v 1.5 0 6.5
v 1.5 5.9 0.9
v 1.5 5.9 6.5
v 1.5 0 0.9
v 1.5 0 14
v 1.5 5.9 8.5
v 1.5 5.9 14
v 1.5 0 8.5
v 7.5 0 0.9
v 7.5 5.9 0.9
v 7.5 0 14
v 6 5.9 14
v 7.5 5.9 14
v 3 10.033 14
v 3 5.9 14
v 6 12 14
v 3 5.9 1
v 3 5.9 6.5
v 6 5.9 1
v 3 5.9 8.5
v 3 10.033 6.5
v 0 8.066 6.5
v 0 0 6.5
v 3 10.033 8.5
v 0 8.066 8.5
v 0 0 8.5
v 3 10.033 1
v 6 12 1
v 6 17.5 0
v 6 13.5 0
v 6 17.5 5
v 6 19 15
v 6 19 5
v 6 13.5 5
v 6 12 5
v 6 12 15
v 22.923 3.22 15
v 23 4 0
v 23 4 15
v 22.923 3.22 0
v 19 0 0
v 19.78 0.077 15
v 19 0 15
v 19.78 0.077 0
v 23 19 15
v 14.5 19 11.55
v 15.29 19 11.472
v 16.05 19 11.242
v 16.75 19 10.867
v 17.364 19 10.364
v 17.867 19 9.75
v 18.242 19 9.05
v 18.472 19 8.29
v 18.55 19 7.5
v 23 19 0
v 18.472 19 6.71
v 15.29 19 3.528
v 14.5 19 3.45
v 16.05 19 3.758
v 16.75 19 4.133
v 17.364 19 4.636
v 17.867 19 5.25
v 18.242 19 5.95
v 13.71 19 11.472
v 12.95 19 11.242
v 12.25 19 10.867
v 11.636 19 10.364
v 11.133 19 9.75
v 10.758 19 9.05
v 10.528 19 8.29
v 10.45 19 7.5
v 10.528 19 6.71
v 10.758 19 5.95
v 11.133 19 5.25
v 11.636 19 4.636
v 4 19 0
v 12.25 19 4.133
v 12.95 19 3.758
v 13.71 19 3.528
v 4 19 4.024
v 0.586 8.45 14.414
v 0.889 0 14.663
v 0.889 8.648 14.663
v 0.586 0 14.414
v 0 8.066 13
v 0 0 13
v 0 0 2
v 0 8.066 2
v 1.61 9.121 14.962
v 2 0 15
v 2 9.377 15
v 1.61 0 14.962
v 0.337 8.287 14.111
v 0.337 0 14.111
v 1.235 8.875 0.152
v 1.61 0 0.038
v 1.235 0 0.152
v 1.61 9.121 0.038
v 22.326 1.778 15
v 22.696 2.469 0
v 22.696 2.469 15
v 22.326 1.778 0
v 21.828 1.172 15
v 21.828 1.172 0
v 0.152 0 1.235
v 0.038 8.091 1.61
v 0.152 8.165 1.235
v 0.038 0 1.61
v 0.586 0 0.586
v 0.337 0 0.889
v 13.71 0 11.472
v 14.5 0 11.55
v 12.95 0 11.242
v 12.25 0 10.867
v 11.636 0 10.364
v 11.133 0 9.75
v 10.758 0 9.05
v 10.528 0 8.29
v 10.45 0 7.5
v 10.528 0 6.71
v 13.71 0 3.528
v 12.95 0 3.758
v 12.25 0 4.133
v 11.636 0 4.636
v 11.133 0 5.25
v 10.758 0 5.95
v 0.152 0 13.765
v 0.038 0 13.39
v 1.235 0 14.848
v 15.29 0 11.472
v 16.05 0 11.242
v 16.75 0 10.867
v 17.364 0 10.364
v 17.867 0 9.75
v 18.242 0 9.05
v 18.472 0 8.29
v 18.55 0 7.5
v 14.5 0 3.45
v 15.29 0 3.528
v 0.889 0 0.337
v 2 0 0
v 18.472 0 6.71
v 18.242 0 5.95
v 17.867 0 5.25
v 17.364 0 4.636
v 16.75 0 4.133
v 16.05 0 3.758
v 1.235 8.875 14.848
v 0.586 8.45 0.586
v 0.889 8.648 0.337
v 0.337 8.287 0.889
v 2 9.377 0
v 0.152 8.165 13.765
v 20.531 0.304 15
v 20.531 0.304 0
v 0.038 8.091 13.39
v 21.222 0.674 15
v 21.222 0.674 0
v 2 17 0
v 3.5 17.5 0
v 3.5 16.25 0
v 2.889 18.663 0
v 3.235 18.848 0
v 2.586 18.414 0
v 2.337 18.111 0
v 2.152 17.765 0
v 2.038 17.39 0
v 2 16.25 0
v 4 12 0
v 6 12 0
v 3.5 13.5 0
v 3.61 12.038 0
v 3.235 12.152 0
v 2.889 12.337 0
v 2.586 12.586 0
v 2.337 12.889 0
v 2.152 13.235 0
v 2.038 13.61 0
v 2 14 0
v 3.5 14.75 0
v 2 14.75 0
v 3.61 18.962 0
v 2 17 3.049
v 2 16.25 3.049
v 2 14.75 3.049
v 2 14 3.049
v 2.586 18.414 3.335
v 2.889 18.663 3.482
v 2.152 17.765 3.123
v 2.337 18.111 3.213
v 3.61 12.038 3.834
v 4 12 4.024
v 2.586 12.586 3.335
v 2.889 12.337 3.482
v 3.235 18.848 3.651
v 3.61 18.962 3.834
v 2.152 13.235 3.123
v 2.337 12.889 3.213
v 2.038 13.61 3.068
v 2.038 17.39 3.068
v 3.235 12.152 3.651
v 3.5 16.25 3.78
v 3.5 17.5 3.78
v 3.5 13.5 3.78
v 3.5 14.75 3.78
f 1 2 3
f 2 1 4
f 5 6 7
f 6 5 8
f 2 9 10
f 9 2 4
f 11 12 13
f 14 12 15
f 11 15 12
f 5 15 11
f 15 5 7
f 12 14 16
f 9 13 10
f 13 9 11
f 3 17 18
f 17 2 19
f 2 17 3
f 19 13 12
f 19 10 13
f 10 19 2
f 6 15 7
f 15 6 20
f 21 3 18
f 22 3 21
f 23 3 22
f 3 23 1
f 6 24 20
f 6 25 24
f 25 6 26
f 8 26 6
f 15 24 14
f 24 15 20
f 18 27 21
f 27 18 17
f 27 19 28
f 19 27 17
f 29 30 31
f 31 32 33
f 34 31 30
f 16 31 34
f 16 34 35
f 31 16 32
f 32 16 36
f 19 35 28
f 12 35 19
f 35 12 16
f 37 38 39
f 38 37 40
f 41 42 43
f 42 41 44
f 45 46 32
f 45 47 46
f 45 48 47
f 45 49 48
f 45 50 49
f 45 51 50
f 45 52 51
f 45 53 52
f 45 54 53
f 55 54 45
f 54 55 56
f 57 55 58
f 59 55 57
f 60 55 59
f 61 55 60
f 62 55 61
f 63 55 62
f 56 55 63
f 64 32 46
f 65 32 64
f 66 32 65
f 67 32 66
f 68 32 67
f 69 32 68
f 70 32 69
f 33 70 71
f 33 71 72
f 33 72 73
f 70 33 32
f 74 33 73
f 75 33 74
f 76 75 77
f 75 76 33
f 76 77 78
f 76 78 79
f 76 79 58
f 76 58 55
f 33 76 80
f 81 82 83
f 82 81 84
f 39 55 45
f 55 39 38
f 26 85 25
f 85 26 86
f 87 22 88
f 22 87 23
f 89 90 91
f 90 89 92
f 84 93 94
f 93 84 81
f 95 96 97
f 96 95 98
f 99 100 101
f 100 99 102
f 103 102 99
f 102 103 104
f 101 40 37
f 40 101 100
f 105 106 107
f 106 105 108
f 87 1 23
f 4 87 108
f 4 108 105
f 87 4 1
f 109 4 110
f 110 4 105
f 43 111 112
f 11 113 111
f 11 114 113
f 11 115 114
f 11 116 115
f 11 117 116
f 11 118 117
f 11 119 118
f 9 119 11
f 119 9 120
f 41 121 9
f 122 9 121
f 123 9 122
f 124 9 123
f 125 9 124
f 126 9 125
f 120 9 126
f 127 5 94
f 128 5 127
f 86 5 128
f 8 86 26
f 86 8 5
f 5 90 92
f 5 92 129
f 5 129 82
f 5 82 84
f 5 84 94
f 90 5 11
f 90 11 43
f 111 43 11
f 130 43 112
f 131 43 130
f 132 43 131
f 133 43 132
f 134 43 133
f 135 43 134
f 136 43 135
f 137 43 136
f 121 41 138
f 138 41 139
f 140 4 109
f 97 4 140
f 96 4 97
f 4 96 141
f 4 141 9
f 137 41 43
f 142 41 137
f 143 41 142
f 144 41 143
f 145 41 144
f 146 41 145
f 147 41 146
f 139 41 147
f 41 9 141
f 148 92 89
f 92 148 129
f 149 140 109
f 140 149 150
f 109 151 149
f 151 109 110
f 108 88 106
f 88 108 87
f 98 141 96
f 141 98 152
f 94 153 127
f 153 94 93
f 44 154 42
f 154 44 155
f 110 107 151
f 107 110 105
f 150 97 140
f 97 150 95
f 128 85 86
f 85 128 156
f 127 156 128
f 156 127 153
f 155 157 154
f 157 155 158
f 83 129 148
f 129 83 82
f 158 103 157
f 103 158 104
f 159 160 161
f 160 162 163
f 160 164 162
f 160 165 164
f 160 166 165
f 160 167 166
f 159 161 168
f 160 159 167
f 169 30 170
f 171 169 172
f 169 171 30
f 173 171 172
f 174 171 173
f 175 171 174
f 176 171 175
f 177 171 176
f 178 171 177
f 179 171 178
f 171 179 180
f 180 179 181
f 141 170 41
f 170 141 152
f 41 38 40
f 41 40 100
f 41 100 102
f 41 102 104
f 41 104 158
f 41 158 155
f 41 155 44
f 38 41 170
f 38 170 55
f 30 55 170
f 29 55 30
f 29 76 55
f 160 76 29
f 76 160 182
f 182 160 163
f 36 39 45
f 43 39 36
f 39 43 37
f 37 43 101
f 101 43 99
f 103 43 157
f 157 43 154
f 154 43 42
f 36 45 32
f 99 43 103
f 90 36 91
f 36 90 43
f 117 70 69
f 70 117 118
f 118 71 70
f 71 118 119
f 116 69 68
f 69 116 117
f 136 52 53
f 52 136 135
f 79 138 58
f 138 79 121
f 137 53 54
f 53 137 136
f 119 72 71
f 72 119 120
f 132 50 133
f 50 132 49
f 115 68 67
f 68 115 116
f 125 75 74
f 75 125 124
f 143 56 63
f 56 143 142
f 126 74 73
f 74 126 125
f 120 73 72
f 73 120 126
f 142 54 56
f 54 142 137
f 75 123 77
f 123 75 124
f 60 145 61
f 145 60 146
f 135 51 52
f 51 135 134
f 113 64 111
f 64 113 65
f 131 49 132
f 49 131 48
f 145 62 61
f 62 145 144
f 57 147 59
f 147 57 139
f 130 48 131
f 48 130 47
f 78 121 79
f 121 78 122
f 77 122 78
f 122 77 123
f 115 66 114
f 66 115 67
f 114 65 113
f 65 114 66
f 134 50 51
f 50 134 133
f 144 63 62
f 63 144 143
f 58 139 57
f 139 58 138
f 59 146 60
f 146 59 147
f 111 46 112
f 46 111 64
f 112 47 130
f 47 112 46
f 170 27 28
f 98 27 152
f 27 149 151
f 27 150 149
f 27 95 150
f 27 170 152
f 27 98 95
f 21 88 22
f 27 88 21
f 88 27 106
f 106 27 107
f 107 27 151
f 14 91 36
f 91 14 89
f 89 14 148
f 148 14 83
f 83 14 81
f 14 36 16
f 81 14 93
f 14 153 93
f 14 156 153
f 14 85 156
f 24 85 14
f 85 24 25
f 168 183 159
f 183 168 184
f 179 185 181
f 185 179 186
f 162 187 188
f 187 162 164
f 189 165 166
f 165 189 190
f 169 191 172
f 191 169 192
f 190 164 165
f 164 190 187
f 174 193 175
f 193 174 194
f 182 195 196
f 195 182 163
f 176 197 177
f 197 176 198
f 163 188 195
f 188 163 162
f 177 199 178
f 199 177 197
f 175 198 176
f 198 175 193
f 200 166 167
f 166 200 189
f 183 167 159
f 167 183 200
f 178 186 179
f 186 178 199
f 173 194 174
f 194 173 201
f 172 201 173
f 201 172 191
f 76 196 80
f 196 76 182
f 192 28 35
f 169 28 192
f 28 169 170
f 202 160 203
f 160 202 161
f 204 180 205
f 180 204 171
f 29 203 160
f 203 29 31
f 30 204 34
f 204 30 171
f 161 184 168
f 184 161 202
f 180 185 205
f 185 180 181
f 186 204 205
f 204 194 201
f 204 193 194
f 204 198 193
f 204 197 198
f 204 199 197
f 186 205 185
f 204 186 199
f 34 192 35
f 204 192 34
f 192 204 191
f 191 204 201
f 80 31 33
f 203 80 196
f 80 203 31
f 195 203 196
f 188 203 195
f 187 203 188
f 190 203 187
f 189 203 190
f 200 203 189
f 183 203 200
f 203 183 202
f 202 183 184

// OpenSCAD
/**
 * X-Axis endstop with configurable length
 *
 * This endstop is intended to work with the Prusa i3
 * Smooth X-Axis with threaded rods upgrade by MazaaFIN
 * (see http://www.thingiverse.com/thing:1103976).
 *
 * I use a different x-carriage that did not reach the
 * vanilla endstop from MazaaFINs files, so I replicated
 * it using his measurements in SCAD but made the length
 * configurable.
 *
 * Made in 2017 by Hendrik Busch using the initial work 
 * of MazaaFIN (http://www.thingiverse.com/MazaaFIN/about).
 * Licensed under a Creative Commons - Attribution - Non
 * Commercial License.
 *
 * https://creativecommons.org/licenses/by-nc/3.0/
 */

/**
 * The length of the endstop (in mm on the x-axis). Do not
 * set this to a value lower than 17.
 * 
 * The original part from MazaaFIN has a length of 19mm.
 */
endstopLength = 19;

/**
 * Use this to generate minimal supports for printing. The supports
 * generated by this option are usually enough to print this part
 * without enabling supports in your slicer (given the correct part
 * orientation). To enable supports, set this to true, to disable them,
 * set this to false.
 */
generateSupports = false;

/** 
 * Number of facets in a 360 degree arc, controls smoothness of rounded
 * edges. 32 is a good compromise between smoothness and processing speed.
 */
$fn=32;

rotate([0, 180, 0]) translate([-23, 0, -15]) mainBlock();

module mainBlock() {
    difference() {
        // solid block with rounded edges
        hull() {
            translate([0, endstopLength-1, 0]) cube([1, 1, 15]);
            translate([4, 4, 0]) cylinder(r=4, h=15);
            rotate([270, 0, 0]) translate([21, -2, 0]) cylinder(r=2, h=endstopLength);
            rotate([270, 0, 0]) translate([21, -13, 0]) cylinder(r=2, h=endstopLength);
        }    
        // M8 hole for smooth rod
        rotate([270, 0, 0]) translate([8.5, -7.5, -0.1]) cylinder(d=8.1, h=endstopLength+0.2);
        
        // Microswitch
        union() {
            // Cutout for the microswitch body
            translate([15.5, -0.1, 1]) cube([6, 6, 13.1]);
            
            // Cutout for the cable slot
            translate([19.9, -0.1, 6.5]) cube([3.6, 10.2, 2]);

            // Cutout for the pins
            translate([17, 5.8, 1]) cube([3, 6.2, 13]);
        }
        
        // Angled cutout
        translate([0,0,-0.1]) linear_extrude(height=15.2) polygon(points=[[17, endstopLength + 0.1], [23.1, endstopLength + 0.1], [23.1, 8], [17, 12]]);
    }
    
    // Cable slot on block
    difference() {
        hull() {
            translate([19, endstopLength-2, 10]) cylinder(r=2, h=5);
            translate([19, endstopLength-5, 10]) cylinder(r=2, h=5);
            translate([17, endstopLength-7, 10]) cube([1,7,5]);
        }
        translate([17, endstopLength-5.5, 9.9]) cube([2.5, 4, 5.2]);
        translate([18.9, endstopLength-4.25, 9.9]) cube([2.2, 1.5, 5.2]);
        translate([17, endstopLength, 7])rotate([90, 0, 0]) linear_extrude(height=7) polygon(points=[[0, 0], [0, 3], [4.1, 5], [4.1, 0]]);
    }
    
    // Support structure
    if (generateSupports) {
        color("Red") {
            difference() {
                
                union() {
                    for (offset = [ 0 : 1.6 : 5.6]) {
                        translate([21.5, offset, 6.5]) cube([1.5, 0.8, 2]);
                    }
                    for (offset = [ 6.4 : 1.6 : 10]) {
                        translate([20, offset, 6.5]) cube([3, 0.8, 2]);
                    }
                }
                // Angled cutout
                translate([0,0,-0.1]) linear_extrude(height=15.2) polygon(points=[[17, 12], [23.1, 12], [23.1, 8], [17, 12]]);
            }
            translate([22.6, 0, 14]) cube([0.4, 8, 1]);
            translate([21.8, 0, 14]) cube([0.4, 8, 1]);
        }
    }
}
